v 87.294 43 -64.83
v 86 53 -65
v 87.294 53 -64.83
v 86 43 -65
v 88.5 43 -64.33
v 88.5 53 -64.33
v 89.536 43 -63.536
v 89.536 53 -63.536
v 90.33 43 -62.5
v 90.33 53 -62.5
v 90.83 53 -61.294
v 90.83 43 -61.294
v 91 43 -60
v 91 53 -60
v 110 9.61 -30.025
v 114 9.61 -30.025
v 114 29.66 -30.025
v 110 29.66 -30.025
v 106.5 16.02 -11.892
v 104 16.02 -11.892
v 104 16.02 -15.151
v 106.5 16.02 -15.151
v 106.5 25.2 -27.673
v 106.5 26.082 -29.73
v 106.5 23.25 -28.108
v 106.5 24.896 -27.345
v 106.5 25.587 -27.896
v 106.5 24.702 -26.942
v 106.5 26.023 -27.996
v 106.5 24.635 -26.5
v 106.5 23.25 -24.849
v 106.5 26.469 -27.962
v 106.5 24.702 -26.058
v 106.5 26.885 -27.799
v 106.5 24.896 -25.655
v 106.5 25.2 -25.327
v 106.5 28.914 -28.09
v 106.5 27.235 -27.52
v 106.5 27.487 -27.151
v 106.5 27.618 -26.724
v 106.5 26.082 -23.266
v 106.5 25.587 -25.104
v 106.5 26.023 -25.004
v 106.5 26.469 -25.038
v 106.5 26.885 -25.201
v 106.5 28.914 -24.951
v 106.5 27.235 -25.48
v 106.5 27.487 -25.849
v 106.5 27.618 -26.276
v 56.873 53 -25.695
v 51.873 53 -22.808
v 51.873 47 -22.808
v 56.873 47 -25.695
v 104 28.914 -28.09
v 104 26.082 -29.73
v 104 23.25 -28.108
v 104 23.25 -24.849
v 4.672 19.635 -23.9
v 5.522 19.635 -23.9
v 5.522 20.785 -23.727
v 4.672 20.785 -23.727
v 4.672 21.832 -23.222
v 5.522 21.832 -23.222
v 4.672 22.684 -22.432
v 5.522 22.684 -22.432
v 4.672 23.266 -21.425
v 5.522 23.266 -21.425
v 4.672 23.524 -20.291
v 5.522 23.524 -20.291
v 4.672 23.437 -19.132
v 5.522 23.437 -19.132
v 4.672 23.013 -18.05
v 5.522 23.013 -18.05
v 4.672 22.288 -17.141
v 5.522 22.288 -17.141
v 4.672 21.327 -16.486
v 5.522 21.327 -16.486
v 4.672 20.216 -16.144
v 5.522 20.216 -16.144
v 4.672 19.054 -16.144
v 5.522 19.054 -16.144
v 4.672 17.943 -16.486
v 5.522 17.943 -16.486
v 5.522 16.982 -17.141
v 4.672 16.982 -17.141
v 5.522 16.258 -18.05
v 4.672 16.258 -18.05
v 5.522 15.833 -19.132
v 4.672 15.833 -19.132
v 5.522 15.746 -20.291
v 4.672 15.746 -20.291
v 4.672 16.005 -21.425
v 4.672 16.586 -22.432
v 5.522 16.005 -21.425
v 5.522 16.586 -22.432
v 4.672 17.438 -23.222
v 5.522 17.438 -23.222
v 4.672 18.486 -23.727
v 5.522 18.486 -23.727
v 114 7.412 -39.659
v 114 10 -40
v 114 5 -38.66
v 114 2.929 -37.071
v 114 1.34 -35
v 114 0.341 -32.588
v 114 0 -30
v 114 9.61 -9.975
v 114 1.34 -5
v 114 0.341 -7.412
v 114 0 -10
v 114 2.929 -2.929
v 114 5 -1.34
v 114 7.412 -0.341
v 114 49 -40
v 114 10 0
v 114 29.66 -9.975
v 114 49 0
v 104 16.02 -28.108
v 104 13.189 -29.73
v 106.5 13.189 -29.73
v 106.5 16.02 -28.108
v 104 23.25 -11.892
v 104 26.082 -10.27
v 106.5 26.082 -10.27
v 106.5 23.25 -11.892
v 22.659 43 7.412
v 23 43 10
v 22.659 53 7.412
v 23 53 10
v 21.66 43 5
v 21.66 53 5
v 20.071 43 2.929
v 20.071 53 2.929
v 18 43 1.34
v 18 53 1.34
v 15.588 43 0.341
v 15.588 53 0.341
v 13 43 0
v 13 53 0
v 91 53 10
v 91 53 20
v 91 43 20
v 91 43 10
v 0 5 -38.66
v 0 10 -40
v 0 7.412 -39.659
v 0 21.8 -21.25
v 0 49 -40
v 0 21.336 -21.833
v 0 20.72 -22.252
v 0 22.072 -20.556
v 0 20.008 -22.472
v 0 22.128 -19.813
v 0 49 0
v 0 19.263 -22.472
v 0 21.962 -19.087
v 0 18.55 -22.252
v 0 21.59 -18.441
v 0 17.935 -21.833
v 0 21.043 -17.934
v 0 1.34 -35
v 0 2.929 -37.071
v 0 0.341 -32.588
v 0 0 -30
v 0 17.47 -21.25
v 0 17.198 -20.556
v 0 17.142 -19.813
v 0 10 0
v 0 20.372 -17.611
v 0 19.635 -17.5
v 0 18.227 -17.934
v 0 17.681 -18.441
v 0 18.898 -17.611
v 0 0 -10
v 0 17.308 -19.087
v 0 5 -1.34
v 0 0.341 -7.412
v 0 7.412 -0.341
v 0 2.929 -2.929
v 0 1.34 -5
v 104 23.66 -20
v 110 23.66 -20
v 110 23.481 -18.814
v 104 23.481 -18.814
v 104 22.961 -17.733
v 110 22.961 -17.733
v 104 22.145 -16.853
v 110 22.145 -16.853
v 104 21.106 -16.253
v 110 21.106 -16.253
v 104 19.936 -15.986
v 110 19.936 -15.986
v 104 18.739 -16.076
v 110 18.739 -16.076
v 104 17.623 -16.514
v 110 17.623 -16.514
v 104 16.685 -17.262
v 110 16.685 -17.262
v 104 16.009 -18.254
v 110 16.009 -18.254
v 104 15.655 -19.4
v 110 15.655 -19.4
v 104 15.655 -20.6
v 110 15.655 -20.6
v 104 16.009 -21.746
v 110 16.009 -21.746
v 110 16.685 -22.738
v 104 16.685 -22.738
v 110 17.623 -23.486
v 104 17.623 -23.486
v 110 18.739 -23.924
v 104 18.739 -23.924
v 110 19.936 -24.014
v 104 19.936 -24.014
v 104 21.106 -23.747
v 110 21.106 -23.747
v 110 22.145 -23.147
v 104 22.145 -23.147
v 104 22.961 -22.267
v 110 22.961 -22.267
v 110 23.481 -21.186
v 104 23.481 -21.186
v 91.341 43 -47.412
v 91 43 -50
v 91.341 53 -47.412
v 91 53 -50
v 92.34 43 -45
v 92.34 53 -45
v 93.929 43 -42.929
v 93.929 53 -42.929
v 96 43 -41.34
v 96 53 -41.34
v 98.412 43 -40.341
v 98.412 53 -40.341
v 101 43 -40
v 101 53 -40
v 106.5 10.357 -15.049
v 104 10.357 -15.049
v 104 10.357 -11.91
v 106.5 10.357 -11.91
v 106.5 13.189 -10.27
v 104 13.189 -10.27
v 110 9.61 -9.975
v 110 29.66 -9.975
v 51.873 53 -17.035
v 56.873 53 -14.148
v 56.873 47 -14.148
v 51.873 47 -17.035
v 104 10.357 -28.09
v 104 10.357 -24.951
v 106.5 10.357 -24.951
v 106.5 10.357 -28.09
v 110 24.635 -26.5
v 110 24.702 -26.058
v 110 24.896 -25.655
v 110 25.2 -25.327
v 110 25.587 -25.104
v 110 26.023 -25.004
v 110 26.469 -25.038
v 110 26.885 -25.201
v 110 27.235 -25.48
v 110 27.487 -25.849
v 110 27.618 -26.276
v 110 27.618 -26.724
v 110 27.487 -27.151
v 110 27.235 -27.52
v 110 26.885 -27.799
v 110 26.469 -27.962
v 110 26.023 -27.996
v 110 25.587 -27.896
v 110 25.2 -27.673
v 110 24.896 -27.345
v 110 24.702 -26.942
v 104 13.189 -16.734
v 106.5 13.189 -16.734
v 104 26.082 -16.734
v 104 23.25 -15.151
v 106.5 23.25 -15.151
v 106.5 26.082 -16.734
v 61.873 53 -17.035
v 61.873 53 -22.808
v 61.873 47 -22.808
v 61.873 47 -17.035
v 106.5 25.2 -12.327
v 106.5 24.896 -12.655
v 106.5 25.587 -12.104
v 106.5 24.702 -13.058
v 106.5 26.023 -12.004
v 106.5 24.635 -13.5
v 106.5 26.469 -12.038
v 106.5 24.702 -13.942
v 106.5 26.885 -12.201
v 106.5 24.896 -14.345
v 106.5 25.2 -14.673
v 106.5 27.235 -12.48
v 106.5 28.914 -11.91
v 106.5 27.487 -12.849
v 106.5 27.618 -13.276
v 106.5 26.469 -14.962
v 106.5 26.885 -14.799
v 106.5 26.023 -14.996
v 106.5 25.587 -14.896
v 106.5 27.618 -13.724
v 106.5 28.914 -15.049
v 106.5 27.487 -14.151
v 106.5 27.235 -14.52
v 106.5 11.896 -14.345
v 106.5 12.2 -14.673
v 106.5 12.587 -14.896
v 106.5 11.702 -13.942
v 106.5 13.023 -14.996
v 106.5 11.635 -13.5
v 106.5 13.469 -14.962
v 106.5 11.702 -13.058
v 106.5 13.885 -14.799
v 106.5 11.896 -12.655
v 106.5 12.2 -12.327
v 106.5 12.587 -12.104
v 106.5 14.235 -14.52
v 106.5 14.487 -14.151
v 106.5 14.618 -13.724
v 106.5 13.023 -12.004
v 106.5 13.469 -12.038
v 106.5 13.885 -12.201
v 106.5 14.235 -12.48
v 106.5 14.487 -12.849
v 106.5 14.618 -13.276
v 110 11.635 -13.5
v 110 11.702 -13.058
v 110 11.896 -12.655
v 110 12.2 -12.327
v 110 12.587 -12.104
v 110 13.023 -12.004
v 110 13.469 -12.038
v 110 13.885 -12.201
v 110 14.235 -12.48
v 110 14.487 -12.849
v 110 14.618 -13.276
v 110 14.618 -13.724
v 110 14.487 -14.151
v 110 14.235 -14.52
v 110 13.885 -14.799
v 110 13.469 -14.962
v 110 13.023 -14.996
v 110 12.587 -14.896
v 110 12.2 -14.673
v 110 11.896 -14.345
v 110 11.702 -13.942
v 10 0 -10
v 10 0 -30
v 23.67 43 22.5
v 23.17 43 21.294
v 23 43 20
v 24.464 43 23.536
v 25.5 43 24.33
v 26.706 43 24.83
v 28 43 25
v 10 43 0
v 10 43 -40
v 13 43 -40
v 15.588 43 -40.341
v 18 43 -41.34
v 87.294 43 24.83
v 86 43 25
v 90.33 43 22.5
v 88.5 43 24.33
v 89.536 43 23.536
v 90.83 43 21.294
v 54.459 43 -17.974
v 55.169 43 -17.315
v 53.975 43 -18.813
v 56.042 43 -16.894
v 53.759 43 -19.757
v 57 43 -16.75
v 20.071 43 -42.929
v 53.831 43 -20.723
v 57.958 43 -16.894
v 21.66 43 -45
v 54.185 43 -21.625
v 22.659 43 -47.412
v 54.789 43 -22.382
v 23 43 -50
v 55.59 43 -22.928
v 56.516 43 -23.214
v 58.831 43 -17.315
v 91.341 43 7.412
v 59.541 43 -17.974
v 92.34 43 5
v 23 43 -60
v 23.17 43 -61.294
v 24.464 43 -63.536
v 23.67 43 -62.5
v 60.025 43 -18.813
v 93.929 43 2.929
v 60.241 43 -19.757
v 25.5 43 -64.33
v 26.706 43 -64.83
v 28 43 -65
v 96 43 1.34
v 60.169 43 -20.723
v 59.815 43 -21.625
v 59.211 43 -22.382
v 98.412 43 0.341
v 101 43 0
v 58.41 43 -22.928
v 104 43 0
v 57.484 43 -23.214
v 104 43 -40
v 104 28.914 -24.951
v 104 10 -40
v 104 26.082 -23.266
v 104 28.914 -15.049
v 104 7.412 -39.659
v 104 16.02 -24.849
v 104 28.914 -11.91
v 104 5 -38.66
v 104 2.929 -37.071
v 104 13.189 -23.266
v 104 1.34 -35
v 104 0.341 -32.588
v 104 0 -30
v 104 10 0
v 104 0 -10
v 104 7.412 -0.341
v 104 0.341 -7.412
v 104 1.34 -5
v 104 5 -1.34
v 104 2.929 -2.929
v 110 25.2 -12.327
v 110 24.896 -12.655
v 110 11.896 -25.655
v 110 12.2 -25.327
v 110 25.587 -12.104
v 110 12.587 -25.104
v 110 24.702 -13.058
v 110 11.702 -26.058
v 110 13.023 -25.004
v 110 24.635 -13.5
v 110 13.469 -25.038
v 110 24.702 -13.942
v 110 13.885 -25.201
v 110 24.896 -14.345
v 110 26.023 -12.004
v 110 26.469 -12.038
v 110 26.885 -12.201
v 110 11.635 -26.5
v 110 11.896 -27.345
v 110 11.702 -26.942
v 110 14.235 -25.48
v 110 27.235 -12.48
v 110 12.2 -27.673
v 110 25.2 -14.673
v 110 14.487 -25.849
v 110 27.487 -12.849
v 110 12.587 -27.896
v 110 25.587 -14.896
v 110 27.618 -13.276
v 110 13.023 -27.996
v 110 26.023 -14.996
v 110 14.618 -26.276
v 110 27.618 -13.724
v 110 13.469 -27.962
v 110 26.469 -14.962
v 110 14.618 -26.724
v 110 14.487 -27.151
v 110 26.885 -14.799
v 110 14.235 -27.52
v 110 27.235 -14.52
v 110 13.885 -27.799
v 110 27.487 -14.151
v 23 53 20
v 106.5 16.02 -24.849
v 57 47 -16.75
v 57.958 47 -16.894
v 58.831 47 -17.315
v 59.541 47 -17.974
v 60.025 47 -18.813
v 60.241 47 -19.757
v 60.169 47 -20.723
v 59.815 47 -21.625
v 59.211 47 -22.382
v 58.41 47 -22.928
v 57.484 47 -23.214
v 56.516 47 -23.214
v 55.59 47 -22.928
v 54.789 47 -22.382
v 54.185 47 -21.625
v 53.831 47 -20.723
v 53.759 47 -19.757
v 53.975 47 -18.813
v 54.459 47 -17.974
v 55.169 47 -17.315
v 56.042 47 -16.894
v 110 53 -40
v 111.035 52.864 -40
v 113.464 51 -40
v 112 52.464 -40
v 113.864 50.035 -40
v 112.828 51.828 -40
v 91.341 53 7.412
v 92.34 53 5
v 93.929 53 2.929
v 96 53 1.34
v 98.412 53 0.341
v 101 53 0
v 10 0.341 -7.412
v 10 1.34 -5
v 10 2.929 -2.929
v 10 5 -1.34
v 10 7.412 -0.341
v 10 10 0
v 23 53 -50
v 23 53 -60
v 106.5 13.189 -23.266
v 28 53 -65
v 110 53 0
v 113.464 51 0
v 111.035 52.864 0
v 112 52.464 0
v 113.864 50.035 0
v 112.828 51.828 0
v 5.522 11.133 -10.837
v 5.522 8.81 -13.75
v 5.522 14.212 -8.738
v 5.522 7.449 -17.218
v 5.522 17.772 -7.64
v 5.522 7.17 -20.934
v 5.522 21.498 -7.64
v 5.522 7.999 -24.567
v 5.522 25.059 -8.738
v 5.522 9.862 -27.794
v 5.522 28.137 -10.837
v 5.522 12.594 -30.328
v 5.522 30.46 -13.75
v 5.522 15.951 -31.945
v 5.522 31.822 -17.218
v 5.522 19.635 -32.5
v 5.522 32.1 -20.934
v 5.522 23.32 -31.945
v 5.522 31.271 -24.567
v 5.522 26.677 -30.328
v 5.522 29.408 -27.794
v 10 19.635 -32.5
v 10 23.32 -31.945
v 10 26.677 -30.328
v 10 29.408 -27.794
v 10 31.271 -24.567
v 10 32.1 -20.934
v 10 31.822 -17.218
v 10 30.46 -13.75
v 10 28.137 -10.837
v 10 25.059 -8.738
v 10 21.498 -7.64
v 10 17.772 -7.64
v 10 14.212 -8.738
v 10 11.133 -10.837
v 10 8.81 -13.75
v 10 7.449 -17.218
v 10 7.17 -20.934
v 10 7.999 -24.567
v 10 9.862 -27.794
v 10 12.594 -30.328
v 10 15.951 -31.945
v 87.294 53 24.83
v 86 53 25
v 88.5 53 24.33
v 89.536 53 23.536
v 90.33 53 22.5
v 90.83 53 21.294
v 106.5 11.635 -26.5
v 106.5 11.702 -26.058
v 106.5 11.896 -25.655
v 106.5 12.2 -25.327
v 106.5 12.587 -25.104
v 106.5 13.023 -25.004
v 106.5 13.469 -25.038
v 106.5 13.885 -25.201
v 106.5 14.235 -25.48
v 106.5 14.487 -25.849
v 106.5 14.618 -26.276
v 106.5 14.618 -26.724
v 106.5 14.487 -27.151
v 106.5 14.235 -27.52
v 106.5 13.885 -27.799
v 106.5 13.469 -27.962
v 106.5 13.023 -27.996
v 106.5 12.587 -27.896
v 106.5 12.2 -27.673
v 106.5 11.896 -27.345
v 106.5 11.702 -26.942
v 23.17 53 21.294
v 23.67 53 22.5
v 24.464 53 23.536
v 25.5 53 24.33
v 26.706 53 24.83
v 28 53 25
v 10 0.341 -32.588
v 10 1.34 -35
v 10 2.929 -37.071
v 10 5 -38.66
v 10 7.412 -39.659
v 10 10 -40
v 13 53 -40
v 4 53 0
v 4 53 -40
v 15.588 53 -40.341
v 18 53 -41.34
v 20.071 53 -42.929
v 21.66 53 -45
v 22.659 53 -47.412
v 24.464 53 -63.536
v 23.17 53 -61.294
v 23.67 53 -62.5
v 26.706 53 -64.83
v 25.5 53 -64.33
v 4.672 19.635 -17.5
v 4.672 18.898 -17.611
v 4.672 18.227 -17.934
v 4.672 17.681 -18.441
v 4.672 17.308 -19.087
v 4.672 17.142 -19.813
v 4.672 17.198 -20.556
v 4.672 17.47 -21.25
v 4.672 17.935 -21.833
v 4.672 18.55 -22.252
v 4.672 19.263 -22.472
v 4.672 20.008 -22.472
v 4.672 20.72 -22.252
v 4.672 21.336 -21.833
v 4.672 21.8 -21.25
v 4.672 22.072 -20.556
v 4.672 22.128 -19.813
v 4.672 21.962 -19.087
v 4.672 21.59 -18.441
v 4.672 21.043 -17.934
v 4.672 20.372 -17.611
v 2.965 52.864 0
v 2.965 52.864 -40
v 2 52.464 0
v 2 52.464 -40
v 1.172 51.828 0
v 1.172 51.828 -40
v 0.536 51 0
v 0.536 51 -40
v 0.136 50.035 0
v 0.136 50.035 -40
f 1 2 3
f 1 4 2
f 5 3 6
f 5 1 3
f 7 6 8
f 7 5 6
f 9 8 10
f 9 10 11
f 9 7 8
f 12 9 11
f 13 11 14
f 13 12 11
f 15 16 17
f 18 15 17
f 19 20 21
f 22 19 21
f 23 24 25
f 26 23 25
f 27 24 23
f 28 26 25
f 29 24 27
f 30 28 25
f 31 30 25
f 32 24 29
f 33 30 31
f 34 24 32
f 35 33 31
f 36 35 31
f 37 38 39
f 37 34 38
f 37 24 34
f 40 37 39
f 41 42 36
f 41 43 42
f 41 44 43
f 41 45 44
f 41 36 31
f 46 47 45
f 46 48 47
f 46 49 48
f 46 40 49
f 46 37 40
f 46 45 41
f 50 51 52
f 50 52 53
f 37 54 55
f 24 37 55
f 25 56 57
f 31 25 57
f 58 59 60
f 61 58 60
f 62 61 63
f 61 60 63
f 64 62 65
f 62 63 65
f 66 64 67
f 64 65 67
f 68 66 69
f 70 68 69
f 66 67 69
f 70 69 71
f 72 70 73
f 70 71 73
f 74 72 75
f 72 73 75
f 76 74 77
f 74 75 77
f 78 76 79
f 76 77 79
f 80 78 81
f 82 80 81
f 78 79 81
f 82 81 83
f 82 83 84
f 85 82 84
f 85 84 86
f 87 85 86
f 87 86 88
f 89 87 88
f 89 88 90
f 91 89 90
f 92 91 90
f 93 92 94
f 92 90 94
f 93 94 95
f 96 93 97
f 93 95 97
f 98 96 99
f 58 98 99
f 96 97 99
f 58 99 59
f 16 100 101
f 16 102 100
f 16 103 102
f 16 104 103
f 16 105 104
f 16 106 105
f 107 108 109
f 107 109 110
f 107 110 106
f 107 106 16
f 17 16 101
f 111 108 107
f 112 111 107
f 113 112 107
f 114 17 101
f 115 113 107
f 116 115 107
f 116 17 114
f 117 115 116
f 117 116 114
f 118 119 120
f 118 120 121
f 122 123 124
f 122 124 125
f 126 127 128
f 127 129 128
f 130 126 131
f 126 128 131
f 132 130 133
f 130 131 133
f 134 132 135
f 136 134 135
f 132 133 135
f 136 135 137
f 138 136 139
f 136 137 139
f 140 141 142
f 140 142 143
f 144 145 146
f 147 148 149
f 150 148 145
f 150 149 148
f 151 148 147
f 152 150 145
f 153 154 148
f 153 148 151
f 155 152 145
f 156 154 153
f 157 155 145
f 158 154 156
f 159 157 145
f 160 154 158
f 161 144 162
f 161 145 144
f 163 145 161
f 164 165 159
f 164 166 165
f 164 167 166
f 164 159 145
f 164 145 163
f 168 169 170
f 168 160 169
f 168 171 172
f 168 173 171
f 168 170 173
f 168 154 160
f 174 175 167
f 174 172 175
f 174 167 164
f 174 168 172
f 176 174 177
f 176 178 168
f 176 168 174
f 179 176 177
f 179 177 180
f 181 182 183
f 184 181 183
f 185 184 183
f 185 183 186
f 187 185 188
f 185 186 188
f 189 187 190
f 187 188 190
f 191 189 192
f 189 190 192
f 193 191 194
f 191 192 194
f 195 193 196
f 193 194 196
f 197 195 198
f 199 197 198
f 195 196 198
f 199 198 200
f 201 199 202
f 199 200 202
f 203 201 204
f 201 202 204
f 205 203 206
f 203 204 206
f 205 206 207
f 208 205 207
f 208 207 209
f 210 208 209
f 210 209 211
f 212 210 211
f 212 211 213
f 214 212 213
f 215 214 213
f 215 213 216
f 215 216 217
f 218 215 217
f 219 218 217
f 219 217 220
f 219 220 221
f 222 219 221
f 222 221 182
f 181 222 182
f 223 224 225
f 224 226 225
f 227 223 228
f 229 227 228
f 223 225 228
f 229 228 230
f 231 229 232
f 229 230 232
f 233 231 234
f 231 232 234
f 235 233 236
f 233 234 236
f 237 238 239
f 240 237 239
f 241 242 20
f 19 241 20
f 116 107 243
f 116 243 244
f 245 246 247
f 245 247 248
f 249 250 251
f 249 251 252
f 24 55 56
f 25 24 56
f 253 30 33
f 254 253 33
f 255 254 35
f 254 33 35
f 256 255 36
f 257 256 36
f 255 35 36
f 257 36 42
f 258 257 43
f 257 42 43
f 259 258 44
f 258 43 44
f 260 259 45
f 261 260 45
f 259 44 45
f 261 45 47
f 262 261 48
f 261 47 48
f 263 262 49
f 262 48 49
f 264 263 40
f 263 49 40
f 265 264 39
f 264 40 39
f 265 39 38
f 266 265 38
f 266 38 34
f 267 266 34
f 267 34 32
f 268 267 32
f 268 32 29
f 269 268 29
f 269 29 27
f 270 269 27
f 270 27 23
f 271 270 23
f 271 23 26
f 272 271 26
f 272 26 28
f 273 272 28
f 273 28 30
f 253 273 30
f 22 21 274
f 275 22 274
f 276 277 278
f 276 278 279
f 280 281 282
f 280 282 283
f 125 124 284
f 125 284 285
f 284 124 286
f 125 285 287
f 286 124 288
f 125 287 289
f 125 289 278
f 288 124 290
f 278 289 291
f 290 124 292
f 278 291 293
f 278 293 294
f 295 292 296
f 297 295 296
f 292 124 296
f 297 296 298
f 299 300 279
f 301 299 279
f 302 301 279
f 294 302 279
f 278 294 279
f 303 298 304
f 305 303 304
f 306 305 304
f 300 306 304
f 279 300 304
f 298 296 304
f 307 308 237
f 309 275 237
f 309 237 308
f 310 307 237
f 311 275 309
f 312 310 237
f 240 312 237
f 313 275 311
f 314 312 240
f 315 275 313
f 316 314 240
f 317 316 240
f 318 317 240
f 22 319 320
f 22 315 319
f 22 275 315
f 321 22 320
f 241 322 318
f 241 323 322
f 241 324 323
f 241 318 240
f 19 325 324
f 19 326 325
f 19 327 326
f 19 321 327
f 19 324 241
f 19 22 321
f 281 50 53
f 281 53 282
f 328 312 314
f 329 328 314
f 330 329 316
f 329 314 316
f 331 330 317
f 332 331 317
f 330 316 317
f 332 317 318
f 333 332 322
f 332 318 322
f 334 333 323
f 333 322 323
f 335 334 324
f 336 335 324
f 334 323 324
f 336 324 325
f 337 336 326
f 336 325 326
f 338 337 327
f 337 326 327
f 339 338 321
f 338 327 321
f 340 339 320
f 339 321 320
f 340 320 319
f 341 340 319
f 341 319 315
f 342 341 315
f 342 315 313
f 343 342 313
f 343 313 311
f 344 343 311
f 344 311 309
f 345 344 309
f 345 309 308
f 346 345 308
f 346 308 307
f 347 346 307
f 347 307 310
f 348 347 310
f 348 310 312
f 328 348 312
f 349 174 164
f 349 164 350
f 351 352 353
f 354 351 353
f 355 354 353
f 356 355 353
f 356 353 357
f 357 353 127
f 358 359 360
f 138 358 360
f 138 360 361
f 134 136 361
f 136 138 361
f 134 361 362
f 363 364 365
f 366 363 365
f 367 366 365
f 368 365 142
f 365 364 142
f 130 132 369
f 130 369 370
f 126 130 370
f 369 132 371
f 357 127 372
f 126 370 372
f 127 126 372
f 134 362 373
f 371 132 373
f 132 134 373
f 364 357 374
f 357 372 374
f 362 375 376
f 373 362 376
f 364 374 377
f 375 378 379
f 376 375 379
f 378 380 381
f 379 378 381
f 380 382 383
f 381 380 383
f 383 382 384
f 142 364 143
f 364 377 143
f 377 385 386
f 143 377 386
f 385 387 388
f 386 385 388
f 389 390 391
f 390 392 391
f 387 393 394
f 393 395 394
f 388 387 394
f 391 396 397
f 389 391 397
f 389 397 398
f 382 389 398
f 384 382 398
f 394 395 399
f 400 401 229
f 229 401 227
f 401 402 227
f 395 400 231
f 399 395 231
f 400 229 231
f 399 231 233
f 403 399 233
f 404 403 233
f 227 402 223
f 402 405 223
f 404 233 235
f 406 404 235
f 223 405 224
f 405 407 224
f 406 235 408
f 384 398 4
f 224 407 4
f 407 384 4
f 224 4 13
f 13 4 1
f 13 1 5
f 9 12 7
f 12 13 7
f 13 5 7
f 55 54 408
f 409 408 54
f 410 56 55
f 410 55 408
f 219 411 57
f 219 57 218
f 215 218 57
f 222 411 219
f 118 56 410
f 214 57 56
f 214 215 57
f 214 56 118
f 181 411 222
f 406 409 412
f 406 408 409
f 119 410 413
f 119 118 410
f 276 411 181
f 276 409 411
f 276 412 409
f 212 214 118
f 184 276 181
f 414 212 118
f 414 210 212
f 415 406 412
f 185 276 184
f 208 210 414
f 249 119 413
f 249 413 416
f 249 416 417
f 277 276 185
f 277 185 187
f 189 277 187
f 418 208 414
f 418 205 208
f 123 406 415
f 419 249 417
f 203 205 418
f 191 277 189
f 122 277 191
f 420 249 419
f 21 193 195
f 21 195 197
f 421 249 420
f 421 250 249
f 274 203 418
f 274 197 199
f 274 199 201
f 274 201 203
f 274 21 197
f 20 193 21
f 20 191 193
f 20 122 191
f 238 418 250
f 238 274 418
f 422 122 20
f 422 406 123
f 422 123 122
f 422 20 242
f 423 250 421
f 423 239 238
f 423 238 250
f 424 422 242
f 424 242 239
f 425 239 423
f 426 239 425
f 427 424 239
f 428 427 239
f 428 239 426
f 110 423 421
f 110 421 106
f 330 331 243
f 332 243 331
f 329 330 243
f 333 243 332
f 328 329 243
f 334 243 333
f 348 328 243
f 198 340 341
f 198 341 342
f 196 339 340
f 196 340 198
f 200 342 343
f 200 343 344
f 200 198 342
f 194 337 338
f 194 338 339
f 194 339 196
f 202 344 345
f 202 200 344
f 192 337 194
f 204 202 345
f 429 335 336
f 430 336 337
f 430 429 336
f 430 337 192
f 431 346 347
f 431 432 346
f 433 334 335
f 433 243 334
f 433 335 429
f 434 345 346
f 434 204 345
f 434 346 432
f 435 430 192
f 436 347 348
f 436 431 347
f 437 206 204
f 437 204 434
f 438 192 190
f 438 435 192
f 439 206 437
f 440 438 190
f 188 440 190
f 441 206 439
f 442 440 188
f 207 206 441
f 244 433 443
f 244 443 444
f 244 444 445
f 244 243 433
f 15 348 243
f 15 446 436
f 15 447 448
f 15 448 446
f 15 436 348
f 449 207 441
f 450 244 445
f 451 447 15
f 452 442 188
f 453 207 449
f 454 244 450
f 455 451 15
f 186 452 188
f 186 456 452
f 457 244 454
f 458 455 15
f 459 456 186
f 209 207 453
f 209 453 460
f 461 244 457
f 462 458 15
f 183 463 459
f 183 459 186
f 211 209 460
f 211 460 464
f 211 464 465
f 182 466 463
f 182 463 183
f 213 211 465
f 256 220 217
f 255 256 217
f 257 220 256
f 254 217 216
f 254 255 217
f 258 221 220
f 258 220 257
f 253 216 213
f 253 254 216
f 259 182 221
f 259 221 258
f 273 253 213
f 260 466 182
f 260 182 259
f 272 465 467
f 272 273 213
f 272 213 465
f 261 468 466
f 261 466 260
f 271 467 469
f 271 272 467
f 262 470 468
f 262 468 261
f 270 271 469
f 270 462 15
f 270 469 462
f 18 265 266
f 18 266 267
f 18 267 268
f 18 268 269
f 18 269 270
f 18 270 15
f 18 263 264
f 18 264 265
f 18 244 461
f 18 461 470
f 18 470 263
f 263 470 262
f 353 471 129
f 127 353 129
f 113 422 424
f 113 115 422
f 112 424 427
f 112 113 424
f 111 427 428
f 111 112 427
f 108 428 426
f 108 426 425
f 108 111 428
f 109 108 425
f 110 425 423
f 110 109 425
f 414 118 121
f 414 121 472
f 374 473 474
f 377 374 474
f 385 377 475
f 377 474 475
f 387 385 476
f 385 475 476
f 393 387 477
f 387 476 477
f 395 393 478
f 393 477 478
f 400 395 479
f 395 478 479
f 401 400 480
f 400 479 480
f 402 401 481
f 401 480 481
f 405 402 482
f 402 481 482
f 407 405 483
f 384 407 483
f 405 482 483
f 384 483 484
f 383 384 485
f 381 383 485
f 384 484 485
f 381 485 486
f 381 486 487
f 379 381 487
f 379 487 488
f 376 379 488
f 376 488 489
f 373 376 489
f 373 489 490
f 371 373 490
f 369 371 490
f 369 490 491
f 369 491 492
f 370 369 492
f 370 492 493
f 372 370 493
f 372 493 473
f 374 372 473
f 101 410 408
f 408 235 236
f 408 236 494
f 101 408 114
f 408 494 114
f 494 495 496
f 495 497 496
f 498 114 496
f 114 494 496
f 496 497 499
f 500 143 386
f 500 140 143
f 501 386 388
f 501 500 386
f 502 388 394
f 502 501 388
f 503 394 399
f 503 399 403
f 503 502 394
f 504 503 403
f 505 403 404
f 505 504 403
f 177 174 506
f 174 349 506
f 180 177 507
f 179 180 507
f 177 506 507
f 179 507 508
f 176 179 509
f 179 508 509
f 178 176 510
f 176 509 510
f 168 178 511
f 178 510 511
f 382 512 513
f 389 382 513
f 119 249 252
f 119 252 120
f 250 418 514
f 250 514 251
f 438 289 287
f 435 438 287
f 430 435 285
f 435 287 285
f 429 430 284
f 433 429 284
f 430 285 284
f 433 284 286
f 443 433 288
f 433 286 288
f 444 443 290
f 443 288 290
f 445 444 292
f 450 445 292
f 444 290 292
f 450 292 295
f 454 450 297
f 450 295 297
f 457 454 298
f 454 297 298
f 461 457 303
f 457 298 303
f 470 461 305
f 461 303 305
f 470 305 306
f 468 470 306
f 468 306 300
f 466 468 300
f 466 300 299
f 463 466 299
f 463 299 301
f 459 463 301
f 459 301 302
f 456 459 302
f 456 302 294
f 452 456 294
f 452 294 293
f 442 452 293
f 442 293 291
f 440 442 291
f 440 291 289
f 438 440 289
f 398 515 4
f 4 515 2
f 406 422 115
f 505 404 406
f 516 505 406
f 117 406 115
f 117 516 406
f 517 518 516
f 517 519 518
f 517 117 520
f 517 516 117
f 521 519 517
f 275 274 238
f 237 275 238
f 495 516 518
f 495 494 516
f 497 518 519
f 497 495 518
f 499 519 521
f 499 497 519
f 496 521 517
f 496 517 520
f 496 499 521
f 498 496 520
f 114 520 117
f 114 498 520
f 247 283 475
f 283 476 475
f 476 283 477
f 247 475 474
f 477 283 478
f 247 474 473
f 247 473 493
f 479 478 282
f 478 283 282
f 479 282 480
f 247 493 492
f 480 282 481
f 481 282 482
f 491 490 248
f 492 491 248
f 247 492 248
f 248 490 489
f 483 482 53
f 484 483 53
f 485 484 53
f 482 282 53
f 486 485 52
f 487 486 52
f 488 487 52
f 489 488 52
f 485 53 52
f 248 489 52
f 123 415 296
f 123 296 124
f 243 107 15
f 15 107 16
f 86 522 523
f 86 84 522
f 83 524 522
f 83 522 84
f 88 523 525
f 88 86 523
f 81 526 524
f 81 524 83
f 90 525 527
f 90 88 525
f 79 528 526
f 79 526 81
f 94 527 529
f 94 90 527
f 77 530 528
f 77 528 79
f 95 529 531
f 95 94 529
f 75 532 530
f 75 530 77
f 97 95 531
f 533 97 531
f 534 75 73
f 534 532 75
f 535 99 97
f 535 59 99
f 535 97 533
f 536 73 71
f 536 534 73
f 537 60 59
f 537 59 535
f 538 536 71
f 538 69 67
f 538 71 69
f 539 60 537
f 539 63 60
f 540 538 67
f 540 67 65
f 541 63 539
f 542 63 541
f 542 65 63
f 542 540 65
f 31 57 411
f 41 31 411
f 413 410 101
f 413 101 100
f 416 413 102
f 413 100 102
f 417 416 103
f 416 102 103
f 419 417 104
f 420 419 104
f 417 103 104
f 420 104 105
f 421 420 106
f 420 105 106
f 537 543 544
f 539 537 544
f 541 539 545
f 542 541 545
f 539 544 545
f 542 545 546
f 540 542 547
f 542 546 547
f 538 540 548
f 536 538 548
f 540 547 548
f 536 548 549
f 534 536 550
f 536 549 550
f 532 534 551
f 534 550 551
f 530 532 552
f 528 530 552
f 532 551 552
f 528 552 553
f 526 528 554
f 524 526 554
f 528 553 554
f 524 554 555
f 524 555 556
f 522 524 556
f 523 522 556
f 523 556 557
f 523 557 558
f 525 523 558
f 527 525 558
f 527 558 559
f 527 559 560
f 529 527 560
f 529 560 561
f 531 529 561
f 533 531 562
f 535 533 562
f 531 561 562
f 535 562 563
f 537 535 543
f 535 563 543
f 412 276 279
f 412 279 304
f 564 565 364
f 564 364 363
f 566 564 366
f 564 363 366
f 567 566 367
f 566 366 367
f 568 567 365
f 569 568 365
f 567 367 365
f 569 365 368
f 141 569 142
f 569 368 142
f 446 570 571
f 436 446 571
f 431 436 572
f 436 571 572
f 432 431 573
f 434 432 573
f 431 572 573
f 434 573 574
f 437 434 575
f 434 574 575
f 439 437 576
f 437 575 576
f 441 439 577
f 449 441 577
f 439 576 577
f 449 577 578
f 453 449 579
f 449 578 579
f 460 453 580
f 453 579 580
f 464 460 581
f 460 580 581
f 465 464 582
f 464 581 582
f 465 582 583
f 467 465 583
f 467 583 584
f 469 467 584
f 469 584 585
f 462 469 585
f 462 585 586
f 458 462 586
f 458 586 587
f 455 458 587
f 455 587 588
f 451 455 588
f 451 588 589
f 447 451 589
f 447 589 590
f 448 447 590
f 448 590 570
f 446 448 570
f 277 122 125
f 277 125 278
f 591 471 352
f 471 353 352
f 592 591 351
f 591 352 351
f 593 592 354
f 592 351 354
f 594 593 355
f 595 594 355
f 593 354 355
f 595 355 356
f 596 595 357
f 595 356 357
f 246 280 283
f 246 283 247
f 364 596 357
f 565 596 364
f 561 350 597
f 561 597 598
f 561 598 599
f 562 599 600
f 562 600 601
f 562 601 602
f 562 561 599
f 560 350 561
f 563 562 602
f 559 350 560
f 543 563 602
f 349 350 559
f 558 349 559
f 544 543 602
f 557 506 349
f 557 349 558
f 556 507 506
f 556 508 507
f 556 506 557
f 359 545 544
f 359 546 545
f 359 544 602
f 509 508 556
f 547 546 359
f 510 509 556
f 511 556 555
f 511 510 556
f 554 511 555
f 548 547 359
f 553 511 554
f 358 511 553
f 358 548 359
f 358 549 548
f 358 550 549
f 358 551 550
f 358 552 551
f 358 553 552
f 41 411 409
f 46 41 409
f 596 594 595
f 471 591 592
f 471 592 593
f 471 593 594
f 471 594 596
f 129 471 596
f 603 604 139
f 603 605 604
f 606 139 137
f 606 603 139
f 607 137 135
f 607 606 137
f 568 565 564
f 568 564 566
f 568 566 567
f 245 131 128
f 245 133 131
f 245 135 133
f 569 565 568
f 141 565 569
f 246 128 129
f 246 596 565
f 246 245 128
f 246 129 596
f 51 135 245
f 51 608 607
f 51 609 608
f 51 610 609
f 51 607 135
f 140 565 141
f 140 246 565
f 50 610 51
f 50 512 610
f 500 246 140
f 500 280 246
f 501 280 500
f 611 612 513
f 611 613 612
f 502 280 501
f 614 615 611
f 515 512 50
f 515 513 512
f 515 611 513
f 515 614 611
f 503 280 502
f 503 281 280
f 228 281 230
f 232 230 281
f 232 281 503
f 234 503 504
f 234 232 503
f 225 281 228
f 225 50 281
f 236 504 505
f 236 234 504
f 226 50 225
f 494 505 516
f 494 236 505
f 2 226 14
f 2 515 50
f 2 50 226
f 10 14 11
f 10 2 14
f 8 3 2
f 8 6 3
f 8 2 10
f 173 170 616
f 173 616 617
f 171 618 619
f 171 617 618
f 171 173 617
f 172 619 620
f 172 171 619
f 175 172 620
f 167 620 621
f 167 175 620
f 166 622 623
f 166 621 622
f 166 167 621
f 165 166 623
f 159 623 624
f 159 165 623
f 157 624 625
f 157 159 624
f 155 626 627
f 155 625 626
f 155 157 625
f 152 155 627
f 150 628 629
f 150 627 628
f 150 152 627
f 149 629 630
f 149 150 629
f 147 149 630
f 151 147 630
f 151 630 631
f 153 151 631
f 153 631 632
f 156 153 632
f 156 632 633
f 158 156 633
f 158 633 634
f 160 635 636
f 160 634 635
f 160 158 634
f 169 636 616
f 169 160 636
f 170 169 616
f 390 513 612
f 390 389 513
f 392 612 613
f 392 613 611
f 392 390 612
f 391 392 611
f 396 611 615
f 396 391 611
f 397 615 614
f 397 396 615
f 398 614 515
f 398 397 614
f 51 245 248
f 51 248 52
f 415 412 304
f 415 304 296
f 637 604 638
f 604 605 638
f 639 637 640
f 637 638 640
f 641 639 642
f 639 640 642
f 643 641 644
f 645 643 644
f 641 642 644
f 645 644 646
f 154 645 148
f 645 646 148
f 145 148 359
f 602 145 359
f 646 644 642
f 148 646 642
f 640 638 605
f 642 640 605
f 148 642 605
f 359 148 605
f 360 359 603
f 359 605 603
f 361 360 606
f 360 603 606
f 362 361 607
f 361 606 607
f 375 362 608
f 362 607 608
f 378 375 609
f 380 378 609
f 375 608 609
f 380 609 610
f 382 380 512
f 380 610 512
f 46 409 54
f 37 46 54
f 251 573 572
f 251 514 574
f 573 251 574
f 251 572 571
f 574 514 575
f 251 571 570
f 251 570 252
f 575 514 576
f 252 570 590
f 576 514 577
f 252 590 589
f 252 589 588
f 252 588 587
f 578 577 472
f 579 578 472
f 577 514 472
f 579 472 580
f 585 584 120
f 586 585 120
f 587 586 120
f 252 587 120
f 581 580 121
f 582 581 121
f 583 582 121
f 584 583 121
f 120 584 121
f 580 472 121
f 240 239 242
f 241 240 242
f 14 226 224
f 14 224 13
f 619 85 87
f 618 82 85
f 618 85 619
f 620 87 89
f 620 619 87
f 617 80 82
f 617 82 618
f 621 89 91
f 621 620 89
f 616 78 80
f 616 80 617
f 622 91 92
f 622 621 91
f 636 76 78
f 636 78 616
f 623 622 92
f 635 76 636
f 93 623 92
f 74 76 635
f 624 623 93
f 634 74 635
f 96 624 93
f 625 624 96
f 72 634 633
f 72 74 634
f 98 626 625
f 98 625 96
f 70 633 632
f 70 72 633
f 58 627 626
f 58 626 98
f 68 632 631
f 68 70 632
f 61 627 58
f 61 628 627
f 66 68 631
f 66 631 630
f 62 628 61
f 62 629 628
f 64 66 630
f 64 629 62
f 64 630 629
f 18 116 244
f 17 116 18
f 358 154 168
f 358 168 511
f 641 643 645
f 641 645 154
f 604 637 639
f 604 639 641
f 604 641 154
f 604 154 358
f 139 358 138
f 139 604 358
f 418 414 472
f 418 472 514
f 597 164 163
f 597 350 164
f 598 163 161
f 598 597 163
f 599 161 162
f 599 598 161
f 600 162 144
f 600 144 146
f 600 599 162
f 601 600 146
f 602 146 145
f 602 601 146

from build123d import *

# Parameters (mm, degrees)
BOSS_EXTRUDE1_DEPTH     = 40
SKETCH2_R               = 12.5
CUT_EXTRUDE1_DEPTH      = 4.4775
FILLET1_R               = 10
CUT_EXTRUDE2_DEPTH      = 131.2
CUT_EXTRUDE2_DEPTH_BACK = 14.2
SKETCH4_R               = 2.5
SKETCH6_W               = 68
SKETCH6_H               = 90
BOSS_EXTRUDE4_DEPTH     = 10
FILLET2_R               = 10
FILLET3_R               = 5
FILLET4_R               = 4
CUT_EXTRUDE3_START      = -2.2025
SKETCH7_R               = 3.9
CUT_EXTRUDE3_DEPTH      = 0.85
SKETCH8_R               = 3.25
CUT_EXTRUDE4_DEPTH      = 10
SKETCH9_R               = 4.025
CUT_EXTRUDE5_DEPTH      = 12
SKETCH10_W              = 20.05
SKETCH10_H              = 20.05
CUT_EXTRUDE6_DEPTH      = 4
CUT_EXTRUDE7_DEPTH      = 6
CUT_EXTRUDE9_DEPTH      = 2.5
CUT_EXTRUDE10_REACH     = 138.104
CUT_EXTRUDE10_START     = 2.5
SKETCH15_R              = 1.5


with BuildPart() as part:
    # Sketch1 → Boss-Extrude1 (new body)
    with BuildSketch(Plane.XY):
        Polygon((10, 0), (10, 43), (104, 43), (104, 0), (114, 0), (114, 53), (0, 53), (0, 0), align=None)
    extrude(amount=-BOSS_EXTRUDE1_DEPTH)

    # Sketch2 → Cut-Extrude1 (cut)
    with BuildSketch(Plane(origin=(10, 0, 0), x_dir=(0, 0, -1), z_dir=(1, 0, 0))):
        with Locations((20, 19.635146369)):
            Circle(SKETCH2_R)
    extrude(amount=-CUT_EXTRUDE1_DEPTH, mode=Mode.SUBTRACT)

    # Fillet1
    fillet1_edges = [part.edges().sort_by_distance(p)[0] for p in [
        (5, 0, 0),
        (109, 0, -40),
        (5, 0, -40),
        (109, 0, 0),
    ]]
    fillet(fillet1_edges, radius=FILLET1_R)

    # Sketch4 → Cut-Extrude2 (cut, two sides: drawn at the far end of the back side and taken through both)
    with BuildSketch(Plane(origin=(7.725, 0, 0), x_dir=(0, 0, -1), z_dir=(1, 0, 0)).offset(-CUT_EXTRUDE2_DEPTH_BACK)):
        with Locations(Location((20, 19.635146369, 0), (0, 0, 180))):
            Circle(SKETCH4_R)
    extrude(amount=CUT_EXTRUDE2_DEPTH + CUT_EXTRUDE2_DEPTH_BACK, mode=Mode.SUBTRACT)

    # Sketch6 → Boss-Extrude4 (add)
    with BuildSketch(Plane(origin=(0, 53, 0), x_dir=(1, 0, 0), z_dir=(0, 1, 0))):
        with Locations((57, 20)):
            Rectangle(SKETCH6_W, SKETCH6_H)
    extrude(amount=-BOSS_EXTRUDE4_DEPTH)

    # Fillet2
    fillet2_edges = [part.edges().sort_by_distance(p)[0] for p in [
        (23, 48, 0),
        (91, 48, 0),
        (91, 48, -40),
        (23, 48, -40),
    ]]
    fillet(fillet2_edges, radius=FILLET2_R)

    # Fillet3
    fillet3_edges = [part.edges().sort_by_distance(p)[0] for p in [
        (23, 48, 25),
        (91, 48, -65),
        (91, 48, 25),
        (23, 48, -65),
    ]]
    fillet(fillet3_edges, radius=FILLET3_R)

    # Fillet4
    fillet4_edges = [part.edges().sort_by_distance(p)[0] for p in [
        (0, 53, -20),
        (114, 53, -20),
    ]]
    fillet(fillet4_edges, radius=FILLET4_R)

    # Sketch7 → Cut-Extrude3 (cut)
    with BuildSketch(Plane(origin=(7.725, 0, 0), x_dir=(0, 0, -1), z_dir=(1, 0, 0)).offset(CUT_EXTRUDE3_START)):
        with Locations((20, 19.635146369)):
            Circle(SKETCH7_R)
    extrude(amount=-CUT_EXTRUDE3_DEPTH, mode=Mode.SUBTRACT)

    # Sketch8 → Cut-Extrude4 (cut)
    with BuildSketch(Plane(origin=(0, 53, 0), x_dir=(1, 0, 0), z_dir=(0, 1, 0))):
        with Locations(Location((57, 20, 0), (0, 0, 270))):
            Circle(SKETCH8_R)
    extrude(amount=-CUT_EXTRUDE4_DEPTH, mode=Mode.SUBTRACT)

    # Sketch9 → Cut-Extrude5 (cut)
    with BuildSketch(Plane(origin=(114, 0, 0), x_dir=(0, 0, -1), z_dir=(1, 0, 0))):
        with Locations(Location((20, 19.635146369, 0), (0, 0, 90))):
            Circle(SKETCH9_R)
    extrude(amount=-CUT_EXTRUDE5_DEPTH, mode=Mode.SUBTRACT)

    # Sketch10 → Cut-Extrude6 (cut)
    with BuildSketch(Plane(origin=(114, 0, 0), x_dir=(0, 0, -1), z_dir=(1, 0, 0))):
        with Locations((20, 19.635146369)):
            Rectangle(SKETCH10_W, SKETCH10_H)
    extrude(amount=-CUT_EXTRUDE6_DEPTH, mode=Mode.SUBTRACT)

    # Sketch14 → Cut-Extrude7 (cut)
    with BuildSketch(Plane(origin=(0, 53, 0), x_dir=(1, 0, 0), z_dir=(0, 1, 0))):
        Polygon((56.872881106, 25.694991584), (61.872881106, 22.808240238), (61.872881106, 17.034737546), (56.872881106, 14.1479862), (51.872881106, 17.034737546), (51.872881106, 22.808240238), align=None)
    extrude(amount=-CUT_EXTRUDE7_DEPTH, mode=Mode.SUBTRACT)

    # Sketch18 → Cut-Extrude9 (cut)
    with BuildSketch(Plane.ZY.offset(-104)):
        Polygon((-15.048857438, 28.91356654), (-11.910134999, 28.91356654), (-10.270487153, 26.081726401), (-11.891583597, 23.249886262), (-15.151000849, 23.249886262), (-16.733963505, 26.081726401), align=None)
        Polygon((-23.266036495, 26.081726401), (-24.951142562, 28.91356654), (-28.089865001, 28.91356654), (-29.729512847, 26.081726401), (-28.108416403, 23.249886262), (-24.848999151, 23.249886262), align=None)
        Polygon((-16.733963505, 13.188566337), (-15.048857438, 10.356726198), (-11.910134999, 10.356726198), (-10.270487153, 13.188566337), (-11.891583597, 16.020406476), (-15.151000849, 16.020406476), align=None)
        Polygon((-24.848999151, 16.020406476), (-23.266036495, 13.188566337), (-24.951142562, 10.356726198), (-28.089865001, 10.356726198), (-29.729512847, 13.188566337), (-28.108416403, 16.020406476), align=None)
    extrude(amount=-CUT_EXTRUDE9_DEPTH, mode=Mode.SUBTRACT)

    # Sketch15 → Cut-Extrude10 (cut, up to next)
    with BuildSketch(Plane.ZY.offset(-104).offset(CUT_EXTRUDE10_START), mode=Mode.PRIVATE) as cut_extrude10_sk1:
        with Locations(Location((-26.5, 26.135146369, 0), (0, 0, 270))):
            Circle(SKETCH15_R)
    cut_extrude10_tool1 = extrude(cut_extrude10_sk1.sketch, amount=-CUT_EXTRUDE10_REACH, mode=Mode.PRIVATE) & part.part
    # Sketch15 → Cut-Extrude10 (cut, up to next)
    with BuildSketch(Plane.ZY.offset(-104).offset(CUT_EXTRUDE10_START), mode=Mode.PRIVATE) as cut_extrude10_sk2:
        with Locations(Location((-13.5, 26.135146369, 0), (0, 0, 270))):
            Circle(SKETCH15_R)
    cut_extrude10_tool2 = extrude(cut_extrude10_sk2.sketch, amount=-CUT_EXTRUDE10_REACH, mode=Mode.PRIVATE) & part.part
    # Sketch15 → Cut-Extrude10 (cut, up to next)
    with BuildSketch(Plane.ZY.offset(-104).offset(CUT_EXTRUDE10_START), mode=Mode.PRIVATE) as cut_extrude10_sk3:
        with Locations(Location((-13.5, 13.135146369, 0), (0, 0, 270))):
            Circle(SKETCH15_R)
    cut_extrude10_tool3 = extrude(cut_extrude10_sk3.sketch, amount=-CUT_EXTRUDE10_REACH, mode=Mode.PRIVATE) & part.part
    # Sketch15 → Cut-Extrude10 (cut, up to next)
    with BuildSketch(Plane.ZY.offset(-104).offset(CUT_EXTRUDE10_START), mode=Mode.PRIVATE) as cut_extrude10_sk4:
        with Locations(Location((-26.5, 13.135146369, 0), (0, 0, 270))):
            Circle(SKETCH15_R)
    cut_extrude10_tool4 = extrude(cut_extrude10_sk4.sketch, amount=-CUT_EXTRUDE10_REACH, mode=Mode.PRIVATE) & part.part
    add(cut_extrude10_tool1.solids().sort_by_distance((101.5, 26.135146, -26.5))[0], mode=Mode.SUBTRACT)
    add(cut_extrude10_tool2.solids().sort_by_distance((101.5, 26.135146, -13.5))[0], mode=Mode.SUBTRACT)
    add(cut_extrude10_tool3.solids().sort_by_distance((101.5, 13.135146, -13.5))[0], mode=Mode.SUBTRACT)
    add(cut_extrude10_tool4.solids().sort_by_distance((101.5, 13.135146, -26.5))[0], mode=Mode.SUBTRACT)


solid = part.part
